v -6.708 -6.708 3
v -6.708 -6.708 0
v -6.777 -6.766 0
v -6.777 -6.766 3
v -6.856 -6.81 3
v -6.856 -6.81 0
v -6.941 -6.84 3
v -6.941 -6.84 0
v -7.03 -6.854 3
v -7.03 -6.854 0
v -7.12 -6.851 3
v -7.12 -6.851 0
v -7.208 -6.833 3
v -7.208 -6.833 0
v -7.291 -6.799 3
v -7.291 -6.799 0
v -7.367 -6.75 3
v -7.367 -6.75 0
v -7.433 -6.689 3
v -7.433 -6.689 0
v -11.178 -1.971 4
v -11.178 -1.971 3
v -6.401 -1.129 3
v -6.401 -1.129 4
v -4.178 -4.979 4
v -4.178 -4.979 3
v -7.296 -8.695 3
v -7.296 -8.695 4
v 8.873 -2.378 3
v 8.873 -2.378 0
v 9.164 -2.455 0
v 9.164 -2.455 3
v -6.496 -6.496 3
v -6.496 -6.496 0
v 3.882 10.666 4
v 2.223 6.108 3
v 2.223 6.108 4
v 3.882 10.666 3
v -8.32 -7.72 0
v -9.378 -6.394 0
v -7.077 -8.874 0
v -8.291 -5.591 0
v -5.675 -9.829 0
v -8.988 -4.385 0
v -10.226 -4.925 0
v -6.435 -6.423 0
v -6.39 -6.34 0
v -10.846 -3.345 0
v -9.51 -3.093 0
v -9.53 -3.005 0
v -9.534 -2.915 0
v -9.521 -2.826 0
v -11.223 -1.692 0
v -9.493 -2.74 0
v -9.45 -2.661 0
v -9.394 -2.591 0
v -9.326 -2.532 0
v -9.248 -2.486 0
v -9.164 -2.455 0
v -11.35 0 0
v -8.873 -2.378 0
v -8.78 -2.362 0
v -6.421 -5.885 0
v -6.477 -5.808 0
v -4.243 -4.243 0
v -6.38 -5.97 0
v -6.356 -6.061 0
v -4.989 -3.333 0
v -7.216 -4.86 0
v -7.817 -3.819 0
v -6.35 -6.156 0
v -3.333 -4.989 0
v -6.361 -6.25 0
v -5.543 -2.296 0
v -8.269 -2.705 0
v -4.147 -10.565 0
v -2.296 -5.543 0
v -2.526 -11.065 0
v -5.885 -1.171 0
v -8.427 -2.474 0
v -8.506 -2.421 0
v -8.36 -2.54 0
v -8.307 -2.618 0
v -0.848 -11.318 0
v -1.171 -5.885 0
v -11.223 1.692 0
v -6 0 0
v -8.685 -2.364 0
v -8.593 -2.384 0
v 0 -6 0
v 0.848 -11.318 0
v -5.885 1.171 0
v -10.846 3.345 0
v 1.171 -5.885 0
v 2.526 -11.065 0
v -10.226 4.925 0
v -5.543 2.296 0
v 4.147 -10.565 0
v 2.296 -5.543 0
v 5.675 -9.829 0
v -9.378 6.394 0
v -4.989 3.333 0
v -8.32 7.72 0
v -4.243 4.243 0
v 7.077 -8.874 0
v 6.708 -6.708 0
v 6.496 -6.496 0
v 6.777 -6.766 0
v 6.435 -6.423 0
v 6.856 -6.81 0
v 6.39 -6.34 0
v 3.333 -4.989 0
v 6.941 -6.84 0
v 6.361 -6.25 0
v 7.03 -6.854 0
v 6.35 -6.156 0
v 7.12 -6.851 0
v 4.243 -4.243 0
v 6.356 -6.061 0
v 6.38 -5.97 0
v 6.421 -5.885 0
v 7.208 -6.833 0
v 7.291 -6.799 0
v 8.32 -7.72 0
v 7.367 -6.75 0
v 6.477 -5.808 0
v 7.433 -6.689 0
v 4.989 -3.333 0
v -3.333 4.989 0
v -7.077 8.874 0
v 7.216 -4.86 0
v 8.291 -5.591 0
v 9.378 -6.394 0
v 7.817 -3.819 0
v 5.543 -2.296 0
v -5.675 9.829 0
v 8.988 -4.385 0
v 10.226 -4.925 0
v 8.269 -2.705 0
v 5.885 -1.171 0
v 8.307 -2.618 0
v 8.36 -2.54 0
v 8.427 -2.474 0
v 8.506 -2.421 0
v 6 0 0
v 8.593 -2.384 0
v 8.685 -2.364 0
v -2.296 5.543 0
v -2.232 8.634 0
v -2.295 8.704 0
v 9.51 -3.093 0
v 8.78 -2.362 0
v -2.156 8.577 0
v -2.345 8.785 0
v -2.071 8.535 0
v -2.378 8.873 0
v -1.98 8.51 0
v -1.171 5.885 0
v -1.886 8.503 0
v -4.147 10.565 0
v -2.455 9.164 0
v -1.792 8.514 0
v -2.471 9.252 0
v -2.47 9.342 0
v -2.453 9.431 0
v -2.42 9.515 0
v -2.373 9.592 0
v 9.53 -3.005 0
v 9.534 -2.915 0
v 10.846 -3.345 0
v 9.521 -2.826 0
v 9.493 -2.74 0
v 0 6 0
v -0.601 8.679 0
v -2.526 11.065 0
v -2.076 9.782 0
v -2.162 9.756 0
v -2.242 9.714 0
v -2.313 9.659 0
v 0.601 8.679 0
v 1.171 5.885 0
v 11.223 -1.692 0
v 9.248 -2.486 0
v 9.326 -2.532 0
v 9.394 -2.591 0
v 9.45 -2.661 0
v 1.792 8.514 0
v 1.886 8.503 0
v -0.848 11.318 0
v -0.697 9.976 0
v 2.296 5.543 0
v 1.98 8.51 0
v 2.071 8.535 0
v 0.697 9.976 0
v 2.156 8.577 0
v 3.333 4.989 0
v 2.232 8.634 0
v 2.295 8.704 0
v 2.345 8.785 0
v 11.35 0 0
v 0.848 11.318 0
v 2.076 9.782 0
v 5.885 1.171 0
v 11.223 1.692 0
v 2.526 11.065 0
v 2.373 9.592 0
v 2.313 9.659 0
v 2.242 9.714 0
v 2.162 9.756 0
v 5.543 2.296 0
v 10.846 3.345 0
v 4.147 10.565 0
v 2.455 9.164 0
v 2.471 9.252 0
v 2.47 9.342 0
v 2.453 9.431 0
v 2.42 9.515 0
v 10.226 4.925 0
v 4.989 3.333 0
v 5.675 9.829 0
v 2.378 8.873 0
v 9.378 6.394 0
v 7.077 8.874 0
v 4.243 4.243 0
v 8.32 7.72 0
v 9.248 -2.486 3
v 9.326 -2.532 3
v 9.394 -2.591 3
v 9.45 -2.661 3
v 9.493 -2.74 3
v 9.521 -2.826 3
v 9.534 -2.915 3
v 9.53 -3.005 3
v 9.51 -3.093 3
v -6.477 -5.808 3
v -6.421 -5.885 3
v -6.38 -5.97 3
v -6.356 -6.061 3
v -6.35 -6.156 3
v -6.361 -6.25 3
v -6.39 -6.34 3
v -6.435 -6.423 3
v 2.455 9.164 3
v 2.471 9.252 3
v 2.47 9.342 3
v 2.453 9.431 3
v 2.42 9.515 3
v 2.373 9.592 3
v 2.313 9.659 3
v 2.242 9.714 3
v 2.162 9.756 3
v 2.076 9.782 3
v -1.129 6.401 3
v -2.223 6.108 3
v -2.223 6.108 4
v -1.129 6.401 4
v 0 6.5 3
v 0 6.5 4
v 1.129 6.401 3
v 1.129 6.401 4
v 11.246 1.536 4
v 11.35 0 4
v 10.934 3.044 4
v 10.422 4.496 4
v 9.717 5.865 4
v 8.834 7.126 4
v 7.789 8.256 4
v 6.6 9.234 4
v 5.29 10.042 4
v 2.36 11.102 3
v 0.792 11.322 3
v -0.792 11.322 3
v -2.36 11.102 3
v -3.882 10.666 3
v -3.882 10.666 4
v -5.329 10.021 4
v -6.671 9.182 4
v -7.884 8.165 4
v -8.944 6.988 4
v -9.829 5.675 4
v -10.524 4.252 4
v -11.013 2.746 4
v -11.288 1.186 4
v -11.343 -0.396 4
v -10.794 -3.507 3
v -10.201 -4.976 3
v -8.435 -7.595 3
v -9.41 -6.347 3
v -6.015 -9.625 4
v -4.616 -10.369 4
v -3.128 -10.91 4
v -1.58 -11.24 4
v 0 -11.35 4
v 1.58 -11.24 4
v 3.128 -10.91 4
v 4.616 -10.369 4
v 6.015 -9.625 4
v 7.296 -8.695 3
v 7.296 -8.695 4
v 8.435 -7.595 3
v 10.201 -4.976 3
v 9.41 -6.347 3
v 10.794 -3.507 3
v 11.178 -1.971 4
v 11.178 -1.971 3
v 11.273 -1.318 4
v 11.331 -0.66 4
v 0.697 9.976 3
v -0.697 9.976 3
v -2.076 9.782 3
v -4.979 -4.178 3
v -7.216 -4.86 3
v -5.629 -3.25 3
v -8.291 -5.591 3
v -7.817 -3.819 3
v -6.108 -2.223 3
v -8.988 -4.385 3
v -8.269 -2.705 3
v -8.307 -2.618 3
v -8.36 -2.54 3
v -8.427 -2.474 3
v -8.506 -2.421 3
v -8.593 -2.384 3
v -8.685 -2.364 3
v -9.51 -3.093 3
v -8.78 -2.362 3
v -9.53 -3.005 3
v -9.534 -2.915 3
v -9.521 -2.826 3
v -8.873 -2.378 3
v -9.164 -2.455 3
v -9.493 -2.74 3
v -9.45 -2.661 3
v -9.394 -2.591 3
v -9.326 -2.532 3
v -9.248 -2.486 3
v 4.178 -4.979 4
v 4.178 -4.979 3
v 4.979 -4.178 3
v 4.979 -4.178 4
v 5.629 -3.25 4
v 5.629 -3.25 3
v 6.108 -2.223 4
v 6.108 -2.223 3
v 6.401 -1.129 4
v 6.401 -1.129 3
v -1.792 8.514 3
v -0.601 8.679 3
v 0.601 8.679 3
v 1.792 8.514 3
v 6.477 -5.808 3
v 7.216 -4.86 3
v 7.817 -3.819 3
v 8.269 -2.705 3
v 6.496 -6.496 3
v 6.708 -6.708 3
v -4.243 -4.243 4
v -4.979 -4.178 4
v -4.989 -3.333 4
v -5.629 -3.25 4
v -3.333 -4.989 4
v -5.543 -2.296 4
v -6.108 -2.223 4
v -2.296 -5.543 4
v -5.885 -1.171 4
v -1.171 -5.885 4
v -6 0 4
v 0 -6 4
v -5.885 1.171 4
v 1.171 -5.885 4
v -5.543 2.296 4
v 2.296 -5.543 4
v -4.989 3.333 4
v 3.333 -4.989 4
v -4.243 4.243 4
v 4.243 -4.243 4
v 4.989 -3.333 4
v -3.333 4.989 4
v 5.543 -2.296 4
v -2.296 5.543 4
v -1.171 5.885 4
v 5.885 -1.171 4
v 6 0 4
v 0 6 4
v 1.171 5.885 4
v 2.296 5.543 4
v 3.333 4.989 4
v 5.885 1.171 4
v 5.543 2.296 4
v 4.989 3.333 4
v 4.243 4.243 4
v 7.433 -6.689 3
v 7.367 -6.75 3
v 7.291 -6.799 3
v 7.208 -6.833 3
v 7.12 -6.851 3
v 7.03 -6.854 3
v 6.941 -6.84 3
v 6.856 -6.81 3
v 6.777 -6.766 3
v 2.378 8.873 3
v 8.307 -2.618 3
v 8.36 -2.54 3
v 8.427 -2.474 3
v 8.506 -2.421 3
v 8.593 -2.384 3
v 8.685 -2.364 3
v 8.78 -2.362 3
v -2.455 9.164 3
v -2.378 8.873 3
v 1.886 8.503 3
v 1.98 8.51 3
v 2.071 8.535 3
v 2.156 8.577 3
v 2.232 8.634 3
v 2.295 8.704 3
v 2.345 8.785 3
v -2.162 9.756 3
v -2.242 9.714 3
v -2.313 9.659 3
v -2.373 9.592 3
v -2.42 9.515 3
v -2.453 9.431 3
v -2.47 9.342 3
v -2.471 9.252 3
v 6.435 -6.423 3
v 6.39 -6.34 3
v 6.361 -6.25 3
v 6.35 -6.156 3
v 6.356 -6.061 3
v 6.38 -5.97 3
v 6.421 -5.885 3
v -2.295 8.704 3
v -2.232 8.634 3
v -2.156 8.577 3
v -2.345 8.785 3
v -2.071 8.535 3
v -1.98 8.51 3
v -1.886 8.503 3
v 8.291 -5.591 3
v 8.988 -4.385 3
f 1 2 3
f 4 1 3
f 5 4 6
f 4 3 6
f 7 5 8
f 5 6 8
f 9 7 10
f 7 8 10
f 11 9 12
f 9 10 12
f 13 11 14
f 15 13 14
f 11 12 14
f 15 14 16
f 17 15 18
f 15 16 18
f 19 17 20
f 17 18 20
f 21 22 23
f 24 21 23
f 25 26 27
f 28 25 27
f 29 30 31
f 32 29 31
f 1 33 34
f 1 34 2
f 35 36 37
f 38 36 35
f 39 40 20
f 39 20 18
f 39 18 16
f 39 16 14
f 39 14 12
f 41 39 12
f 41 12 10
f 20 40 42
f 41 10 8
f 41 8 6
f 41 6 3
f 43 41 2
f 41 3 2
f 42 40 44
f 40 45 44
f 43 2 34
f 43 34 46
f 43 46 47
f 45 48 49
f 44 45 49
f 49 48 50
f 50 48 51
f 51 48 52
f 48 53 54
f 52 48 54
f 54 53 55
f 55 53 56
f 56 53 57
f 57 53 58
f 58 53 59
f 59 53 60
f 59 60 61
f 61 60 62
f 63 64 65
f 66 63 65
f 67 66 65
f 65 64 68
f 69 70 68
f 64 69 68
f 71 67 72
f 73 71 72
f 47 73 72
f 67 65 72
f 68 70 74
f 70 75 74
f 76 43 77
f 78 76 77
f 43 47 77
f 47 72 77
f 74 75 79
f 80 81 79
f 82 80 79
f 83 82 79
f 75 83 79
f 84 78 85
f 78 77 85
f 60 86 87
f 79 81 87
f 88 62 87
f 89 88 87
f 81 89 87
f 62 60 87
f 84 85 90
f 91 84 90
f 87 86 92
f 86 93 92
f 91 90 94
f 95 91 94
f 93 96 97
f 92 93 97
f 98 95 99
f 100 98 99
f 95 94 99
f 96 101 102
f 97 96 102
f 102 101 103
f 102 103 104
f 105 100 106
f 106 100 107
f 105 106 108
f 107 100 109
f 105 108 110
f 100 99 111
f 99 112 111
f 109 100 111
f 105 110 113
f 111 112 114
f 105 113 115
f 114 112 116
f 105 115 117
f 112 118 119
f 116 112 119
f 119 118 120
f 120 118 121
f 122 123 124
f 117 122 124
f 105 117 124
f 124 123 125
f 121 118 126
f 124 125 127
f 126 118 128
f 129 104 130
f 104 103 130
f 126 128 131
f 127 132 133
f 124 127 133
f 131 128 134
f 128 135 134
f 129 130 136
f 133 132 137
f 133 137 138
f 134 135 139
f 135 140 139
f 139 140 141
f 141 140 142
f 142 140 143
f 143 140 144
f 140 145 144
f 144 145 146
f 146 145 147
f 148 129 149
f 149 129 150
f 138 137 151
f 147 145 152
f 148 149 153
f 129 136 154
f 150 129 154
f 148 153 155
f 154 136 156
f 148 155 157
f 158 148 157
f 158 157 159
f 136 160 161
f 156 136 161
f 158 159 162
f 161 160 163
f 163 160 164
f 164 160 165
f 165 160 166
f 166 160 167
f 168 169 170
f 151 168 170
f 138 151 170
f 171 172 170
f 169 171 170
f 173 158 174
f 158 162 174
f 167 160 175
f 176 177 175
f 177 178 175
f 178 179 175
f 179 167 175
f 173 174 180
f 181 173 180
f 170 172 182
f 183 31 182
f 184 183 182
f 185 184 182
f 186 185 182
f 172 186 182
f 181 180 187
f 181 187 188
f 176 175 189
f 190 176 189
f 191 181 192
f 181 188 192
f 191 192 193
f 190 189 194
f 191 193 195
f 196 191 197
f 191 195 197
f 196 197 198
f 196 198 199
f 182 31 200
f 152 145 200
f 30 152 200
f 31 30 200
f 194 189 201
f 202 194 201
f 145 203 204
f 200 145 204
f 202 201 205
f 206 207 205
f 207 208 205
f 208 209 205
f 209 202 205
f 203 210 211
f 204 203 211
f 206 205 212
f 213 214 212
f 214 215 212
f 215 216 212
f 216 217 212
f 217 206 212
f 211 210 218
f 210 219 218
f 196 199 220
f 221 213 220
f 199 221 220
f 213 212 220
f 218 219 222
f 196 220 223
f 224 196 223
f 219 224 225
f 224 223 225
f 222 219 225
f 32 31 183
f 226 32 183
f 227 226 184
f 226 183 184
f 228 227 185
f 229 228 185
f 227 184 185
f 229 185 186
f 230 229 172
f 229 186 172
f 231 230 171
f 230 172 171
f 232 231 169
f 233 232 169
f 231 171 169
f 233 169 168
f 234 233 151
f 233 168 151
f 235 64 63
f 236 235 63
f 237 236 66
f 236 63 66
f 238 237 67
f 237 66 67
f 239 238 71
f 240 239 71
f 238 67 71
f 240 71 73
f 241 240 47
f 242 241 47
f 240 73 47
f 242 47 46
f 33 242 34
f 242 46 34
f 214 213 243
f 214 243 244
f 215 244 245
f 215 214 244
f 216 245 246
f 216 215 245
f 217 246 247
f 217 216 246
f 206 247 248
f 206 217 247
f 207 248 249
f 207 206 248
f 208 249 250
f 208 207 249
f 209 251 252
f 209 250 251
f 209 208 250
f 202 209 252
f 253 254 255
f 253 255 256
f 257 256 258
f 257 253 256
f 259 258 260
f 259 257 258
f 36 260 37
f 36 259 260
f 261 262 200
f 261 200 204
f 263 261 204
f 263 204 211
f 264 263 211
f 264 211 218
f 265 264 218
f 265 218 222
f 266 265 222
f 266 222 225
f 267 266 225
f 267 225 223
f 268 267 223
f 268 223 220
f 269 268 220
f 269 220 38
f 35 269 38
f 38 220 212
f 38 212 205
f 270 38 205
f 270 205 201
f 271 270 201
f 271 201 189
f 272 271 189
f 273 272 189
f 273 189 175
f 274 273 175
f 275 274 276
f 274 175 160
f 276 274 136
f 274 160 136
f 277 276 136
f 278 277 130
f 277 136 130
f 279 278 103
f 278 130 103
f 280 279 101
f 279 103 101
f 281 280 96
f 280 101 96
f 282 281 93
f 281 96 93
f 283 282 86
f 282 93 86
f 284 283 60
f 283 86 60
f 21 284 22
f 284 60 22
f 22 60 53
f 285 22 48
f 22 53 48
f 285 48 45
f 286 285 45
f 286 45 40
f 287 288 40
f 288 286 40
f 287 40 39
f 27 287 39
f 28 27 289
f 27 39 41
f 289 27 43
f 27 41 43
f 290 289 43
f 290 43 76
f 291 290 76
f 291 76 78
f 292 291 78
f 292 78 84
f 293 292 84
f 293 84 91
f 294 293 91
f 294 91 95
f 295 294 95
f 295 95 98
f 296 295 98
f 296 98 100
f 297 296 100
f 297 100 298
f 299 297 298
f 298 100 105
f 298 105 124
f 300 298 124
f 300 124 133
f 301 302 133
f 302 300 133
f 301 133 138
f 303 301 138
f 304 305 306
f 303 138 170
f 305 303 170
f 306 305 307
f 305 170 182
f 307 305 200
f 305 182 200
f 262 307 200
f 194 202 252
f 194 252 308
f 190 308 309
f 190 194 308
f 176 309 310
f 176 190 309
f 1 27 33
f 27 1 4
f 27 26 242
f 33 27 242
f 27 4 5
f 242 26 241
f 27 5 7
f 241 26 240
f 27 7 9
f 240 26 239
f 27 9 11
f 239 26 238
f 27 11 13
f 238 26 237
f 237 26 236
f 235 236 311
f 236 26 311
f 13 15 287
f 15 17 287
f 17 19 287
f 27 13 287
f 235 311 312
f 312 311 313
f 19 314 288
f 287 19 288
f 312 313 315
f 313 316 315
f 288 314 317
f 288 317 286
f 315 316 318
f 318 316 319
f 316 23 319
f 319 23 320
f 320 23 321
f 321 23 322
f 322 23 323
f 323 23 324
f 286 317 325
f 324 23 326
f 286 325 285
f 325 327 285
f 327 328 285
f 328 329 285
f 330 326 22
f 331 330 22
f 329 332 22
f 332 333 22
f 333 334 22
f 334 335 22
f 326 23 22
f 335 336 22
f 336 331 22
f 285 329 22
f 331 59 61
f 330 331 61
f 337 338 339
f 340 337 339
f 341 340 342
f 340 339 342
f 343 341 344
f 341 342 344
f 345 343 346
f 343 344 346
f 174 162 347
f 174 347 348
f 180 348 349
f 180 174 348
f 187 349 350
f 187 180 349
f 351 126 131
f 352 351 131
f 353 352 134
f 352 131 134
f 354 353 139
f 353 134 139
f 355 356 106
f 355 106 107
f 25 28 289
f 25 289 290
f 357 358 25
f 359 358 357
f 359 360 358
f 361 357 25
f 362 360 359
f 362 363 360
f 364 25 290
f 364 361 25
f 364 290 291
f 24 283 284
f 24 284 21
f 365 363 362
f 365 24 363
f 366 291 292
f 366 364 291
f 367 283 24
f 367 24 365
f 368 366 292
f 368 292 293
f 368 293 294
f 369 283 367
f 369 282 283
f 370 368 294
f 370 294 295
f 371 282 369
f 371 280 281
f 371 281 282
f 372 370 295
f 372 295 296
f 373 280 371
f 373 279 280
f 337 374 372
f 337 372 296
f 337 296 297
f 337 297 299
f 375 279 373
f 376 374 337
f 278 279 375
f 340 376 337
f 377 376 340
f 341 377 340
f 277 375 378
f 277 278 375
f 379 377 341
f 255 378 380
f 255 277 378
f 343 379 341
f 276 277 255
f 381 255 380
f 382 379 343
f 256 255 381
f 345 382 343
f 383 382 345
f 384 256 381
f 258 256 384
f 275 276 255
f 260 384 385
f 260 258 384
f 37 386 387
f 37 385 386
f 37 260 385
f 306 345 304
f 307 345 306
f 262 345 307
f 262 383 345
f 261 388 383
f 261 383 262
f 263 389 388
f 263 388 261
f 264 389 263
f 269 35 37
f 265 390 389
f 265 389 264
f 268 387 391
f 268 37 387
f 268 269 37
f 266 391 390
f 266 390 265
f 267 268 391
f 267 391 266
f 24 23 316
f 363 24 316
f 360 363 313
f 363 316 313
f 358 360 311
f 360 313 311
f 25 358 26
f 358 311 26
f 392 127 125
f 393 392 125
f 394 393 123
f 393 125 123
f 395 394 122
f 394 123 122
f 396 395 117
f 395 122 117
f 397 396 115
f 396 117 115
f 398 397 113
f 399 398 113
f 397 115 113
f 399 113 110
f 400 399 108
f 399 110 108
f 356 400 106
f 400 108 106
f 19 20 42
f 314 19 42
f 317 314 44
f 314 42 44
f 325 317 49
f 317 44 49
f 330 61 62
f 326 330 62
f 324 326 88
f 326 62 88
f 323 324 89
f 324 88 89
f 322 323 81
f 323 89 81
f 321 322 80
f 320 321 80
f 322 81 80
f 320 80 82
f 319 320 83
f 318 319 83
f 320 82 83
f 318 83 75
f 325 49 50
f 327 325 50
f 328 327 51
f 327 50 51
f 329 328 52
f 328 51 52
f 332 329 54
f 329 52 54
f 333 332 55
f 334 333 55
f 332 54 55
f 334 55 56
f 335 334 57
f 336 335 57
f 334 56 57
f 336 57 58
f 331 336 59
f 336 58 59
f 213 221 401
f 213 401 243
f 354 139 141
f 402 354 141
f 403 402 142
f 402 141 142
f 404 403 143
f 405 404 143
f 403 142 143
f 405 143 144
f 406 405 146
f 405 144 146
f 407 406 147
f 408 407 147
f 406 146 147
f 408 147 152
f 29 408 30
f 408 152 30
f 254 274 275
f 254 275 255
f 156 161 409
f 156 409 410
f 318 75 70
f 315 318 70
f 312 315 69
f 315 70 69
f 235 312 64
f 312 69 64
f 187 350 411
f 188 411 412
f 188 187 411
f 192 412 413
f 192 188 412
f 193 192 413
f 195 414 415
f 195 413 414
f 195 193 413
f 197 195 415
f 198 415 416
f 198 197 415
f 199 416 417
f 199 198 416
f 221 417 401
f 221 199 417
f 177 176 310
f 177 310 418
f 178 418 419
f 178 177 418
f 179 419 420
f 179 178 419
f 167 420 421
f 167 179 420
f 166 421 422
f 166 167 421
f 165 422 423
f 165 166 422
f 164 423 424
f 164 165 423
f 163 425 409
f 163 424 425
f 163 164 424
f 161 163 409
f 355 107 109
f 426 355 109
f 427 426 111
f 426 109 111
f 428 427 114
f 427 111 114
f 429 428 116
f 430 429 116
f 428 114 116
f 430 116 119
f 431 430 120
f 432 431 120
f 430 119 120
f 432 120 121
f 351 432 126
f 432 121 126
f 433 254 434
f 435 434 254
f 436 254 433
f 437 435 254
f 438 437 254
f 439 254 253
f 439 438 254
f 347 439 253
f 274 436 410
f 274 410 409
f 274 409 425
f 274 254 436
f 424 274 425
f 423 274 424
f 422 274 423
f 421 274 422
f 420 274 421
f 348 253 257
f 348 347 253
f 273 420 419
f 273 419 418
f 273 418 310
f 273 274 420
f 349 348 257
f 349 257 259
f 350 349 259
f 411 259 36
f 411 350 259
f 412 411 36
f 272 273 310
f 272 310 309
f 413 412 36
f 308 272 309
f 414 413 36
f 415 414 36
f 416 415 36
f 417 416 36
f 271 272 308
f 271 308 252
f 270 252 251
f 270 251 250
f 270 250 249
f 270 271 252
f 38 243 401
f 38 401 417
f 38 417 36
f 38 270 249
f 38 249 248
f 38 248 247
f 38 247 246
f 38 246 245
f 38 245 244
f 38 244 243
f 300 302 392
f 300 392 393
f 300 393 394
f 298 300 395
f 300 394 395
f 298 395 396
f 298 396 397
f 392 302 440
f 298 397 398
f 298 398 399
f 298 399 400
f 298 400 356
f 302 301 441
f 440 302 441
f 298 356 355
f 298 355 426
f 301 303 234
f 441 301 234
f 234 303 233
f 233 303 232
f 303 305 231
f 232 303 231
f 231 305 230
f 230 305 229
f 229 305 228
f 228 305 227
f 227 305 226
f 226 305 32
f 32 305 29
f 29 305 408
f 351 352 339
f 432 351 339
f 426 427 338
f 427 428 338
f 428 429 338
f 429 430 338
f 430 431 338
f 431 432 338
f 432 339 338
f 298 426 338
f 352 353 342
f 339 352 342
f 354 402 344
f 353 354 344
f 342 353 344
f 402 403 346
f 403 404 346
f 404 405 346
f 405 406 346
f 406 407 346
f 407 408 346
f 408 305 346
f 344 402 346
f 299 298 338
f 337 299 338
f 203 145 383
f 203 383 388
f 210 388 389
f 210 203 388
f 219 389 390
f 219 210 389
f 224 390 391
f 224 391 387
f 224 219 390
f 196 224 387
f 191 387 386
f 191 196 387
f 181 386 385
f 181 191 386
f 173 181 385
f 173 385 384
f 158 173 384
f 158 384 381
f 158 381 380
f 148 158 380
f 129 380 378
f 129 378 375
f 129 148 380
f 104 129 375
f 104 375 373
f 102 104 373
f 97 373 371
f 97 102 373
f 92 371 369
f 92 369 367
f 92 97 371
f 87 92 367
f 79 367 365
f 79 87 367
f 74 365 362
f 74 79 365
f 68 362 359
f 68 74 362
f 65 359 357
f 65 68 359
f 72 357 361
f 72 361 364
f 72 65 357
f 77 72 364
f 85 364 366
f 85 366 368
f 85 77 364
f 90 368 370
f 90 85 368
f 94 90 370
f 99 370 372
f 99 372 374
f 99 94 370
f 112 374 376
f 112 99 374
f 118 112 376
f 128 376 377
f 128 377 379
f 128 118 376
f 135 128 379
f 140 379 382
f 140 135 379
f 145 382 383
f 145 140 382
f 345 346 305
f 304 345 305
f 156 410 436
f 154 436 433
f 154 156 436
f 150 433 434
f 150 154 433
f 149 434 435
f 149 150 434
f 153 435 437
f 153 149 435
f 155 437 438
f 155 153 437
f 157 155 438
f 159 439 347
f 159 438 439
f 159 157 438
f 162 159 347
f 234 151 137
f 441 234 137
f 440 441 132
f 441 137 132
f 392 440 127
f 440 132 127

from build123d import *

# Parameters (mm, degrees)
CROQUIS1_R              = 11.35
CROQUIS1_R_2            = 6
SALIENTE_EXTRUIR1_DEPTH = 4
CORTAR_EXTRUIR1_START   = -1
CORTAR_EXTRUIR1_DEPTH   = 1


with BuildPart() as part:
    # Croquis1 → Saliente-Extruir1 (new body)
    with BuildSketch(Plane.XY):
        Circle(CROQUIS1_R)
        Circle(CROQUIS1_R_2, mode=Mode.SUBTRACT)
        with BuildLine():
            Line((2.377616051, 8.873383904), (2.455373053, 9.163576986))
            ThreePointArc((2.455373053, 9.163576986), (2.398691549, 9.55429889), (2.0762212, 9.782091061))
            ThreePointArc((2.0762212, 9.782091061), (0, 10), (-2.0762212, 9.782091061))
            ThreePointArc((-2.0762212, 9.782091061), (-2.398691549, 9.55429889), (-2.455373053, 9.163576986))
            Line((-2.455373053, 9.163576986), (-2.377616051, 8.873383904))
            ThreePointArc((-2.377616051, 8.873383904), (-2.15633175, 8.576736735), (-1.791682859, 8.513511175))
            ThreePointArc((-1.791682859, 8.513511175), (0, 8.7), (1.791682859, 8.513511175))
            ThreePointArc((1.791682859, 8.513511175), (2.15633175, 8.576736735), (2.377616051, 8.873383904))
        make_face(mode=Mode.SUBTRACT)
        with BuildLine():
            Line((8.873383904, -2.377616051), (9.163576986, -2.455373053))
            ThreePointArc((9.163576986, -2.455373053), (9.473611328, -2.699821628), (9.509649961, -3.092985228))
            ThreePointArc((9.509649961, -3.092985228), (8.660254038, -5), (7.433428761, -6.689105834))
            ThreePointArc((7.433428761, -6.689105834), (7.074919779, -6.854477262), (6.708203932, -6.708203932))
            Line((6.708203932, -6.708203932), (6.495767853, -6.495767853))
            ThreePointArc((6.495767853, -6.495767853), (6.34950602, -6.155806442), (6.477075524, -5.808398459))
            ThreePointArc((6.477075524, -5.808398459), (7.534421013, -4.35), (8.268758383, -2.705112716))
            ThreePointArc((8.268758383, -2.705112716), (8.505837769, -2.420930294), (8.873383904, -2.377616051))
        make_face(mode=Mode.SUBTRACT)
        with BuildLine():
            Line((-6.495767853, -6.495767853), (-6.708203932, -6.708203932))
            ThreePointArc((-6.708203932, -6.708203932), (-7.074919779, -6.854477262), (-7.433428761, -6.689105834))
            ThreePointArc((-7.433428761, -6.689105834), (-8.660254038, -5), (-9.509649961, -3.092985228))
            ThreePointArc((-9.509649961, -3.092985228), (-9.473611328, -2.699821628), (-9.163576986, -2.455373053))
            Line((-9.163576986, -2.455373053), (-8.873383904, -2.377616051))
            ThreePointArc((-8.873383904, -2.377616051), (-8.505837769, -2.420930294), (-8.268758383, -2.705112716))
            ThreePointArc((-8.268758383, -2.705112716), (-7.534421013, -4.35), (-6.477075524, -5.808398459))
            ThreePointArc((-6.477075524, -5.808398459), (-6.34950602, -6.155806442), (-6.495767853, -6.495767853))
        make_face(mode=Mode.SUBTRACT)
    extrude(amount=SALIENTE_EXTRUIR1_DEPTH)

    # Croquis2 → Cortar-Extruir1 (cut)
    with BuildSketch(Plane.XY.offset(4).offset(CORTAR_EXTRUIR1_START)):
        with BuildLine():
            Line((2.223130932, 6.108002035), (3.881928627, 10.665511246))
            ThreePointArc((3.881928627, 10.665511246), (0, 11.35), (-3.881928627, 10.665511246))
            Line((-3.881928627, 10.665511246), (-2.223130932, 6.108002035))
            ThreePointArc((-2.223130932, 6.108002035), (0, 6.5), (2.223130932, 6.108002035))
        make_face()
        with BuildLine():
            Line((6.401250395, -1.128713155), (11.177567997, -1.970906817))
            ThreePointArc((11.177567997, -1.970906817), (9.829388333, -5.675), (7.29563937, -8.694604429))
            Line((7.29563937, -8.694604429), (4.178119463, -4.97928888))
            ThreePointArc((4.178119463, -4.97928888), (5.629165125, -3.25), (6.401250395, -1.128713155))
        make_face()
        with BuildLine():
            Line((-4.178119463, -4.97928888), (-7.29563937, -8.694604429))
            ThreePointArc((-7.29563937, -8.694604429), (-9.829388333, -5.675), (-11.177567997, -1.970906817))
            Line((-11.177567997, -1.970906817), (-6.401250395, -1.128713155))
            ThreePointArc((-6.401250395, -1.128713155), (-5.629165125, -3.25), (-4.178119463, -4.97928888))
        make_face()
    extrude(amount=CORTAR_EXTRUIR1_DEPTH, mode=Mode.SUBTRACT)


solid = part.part
